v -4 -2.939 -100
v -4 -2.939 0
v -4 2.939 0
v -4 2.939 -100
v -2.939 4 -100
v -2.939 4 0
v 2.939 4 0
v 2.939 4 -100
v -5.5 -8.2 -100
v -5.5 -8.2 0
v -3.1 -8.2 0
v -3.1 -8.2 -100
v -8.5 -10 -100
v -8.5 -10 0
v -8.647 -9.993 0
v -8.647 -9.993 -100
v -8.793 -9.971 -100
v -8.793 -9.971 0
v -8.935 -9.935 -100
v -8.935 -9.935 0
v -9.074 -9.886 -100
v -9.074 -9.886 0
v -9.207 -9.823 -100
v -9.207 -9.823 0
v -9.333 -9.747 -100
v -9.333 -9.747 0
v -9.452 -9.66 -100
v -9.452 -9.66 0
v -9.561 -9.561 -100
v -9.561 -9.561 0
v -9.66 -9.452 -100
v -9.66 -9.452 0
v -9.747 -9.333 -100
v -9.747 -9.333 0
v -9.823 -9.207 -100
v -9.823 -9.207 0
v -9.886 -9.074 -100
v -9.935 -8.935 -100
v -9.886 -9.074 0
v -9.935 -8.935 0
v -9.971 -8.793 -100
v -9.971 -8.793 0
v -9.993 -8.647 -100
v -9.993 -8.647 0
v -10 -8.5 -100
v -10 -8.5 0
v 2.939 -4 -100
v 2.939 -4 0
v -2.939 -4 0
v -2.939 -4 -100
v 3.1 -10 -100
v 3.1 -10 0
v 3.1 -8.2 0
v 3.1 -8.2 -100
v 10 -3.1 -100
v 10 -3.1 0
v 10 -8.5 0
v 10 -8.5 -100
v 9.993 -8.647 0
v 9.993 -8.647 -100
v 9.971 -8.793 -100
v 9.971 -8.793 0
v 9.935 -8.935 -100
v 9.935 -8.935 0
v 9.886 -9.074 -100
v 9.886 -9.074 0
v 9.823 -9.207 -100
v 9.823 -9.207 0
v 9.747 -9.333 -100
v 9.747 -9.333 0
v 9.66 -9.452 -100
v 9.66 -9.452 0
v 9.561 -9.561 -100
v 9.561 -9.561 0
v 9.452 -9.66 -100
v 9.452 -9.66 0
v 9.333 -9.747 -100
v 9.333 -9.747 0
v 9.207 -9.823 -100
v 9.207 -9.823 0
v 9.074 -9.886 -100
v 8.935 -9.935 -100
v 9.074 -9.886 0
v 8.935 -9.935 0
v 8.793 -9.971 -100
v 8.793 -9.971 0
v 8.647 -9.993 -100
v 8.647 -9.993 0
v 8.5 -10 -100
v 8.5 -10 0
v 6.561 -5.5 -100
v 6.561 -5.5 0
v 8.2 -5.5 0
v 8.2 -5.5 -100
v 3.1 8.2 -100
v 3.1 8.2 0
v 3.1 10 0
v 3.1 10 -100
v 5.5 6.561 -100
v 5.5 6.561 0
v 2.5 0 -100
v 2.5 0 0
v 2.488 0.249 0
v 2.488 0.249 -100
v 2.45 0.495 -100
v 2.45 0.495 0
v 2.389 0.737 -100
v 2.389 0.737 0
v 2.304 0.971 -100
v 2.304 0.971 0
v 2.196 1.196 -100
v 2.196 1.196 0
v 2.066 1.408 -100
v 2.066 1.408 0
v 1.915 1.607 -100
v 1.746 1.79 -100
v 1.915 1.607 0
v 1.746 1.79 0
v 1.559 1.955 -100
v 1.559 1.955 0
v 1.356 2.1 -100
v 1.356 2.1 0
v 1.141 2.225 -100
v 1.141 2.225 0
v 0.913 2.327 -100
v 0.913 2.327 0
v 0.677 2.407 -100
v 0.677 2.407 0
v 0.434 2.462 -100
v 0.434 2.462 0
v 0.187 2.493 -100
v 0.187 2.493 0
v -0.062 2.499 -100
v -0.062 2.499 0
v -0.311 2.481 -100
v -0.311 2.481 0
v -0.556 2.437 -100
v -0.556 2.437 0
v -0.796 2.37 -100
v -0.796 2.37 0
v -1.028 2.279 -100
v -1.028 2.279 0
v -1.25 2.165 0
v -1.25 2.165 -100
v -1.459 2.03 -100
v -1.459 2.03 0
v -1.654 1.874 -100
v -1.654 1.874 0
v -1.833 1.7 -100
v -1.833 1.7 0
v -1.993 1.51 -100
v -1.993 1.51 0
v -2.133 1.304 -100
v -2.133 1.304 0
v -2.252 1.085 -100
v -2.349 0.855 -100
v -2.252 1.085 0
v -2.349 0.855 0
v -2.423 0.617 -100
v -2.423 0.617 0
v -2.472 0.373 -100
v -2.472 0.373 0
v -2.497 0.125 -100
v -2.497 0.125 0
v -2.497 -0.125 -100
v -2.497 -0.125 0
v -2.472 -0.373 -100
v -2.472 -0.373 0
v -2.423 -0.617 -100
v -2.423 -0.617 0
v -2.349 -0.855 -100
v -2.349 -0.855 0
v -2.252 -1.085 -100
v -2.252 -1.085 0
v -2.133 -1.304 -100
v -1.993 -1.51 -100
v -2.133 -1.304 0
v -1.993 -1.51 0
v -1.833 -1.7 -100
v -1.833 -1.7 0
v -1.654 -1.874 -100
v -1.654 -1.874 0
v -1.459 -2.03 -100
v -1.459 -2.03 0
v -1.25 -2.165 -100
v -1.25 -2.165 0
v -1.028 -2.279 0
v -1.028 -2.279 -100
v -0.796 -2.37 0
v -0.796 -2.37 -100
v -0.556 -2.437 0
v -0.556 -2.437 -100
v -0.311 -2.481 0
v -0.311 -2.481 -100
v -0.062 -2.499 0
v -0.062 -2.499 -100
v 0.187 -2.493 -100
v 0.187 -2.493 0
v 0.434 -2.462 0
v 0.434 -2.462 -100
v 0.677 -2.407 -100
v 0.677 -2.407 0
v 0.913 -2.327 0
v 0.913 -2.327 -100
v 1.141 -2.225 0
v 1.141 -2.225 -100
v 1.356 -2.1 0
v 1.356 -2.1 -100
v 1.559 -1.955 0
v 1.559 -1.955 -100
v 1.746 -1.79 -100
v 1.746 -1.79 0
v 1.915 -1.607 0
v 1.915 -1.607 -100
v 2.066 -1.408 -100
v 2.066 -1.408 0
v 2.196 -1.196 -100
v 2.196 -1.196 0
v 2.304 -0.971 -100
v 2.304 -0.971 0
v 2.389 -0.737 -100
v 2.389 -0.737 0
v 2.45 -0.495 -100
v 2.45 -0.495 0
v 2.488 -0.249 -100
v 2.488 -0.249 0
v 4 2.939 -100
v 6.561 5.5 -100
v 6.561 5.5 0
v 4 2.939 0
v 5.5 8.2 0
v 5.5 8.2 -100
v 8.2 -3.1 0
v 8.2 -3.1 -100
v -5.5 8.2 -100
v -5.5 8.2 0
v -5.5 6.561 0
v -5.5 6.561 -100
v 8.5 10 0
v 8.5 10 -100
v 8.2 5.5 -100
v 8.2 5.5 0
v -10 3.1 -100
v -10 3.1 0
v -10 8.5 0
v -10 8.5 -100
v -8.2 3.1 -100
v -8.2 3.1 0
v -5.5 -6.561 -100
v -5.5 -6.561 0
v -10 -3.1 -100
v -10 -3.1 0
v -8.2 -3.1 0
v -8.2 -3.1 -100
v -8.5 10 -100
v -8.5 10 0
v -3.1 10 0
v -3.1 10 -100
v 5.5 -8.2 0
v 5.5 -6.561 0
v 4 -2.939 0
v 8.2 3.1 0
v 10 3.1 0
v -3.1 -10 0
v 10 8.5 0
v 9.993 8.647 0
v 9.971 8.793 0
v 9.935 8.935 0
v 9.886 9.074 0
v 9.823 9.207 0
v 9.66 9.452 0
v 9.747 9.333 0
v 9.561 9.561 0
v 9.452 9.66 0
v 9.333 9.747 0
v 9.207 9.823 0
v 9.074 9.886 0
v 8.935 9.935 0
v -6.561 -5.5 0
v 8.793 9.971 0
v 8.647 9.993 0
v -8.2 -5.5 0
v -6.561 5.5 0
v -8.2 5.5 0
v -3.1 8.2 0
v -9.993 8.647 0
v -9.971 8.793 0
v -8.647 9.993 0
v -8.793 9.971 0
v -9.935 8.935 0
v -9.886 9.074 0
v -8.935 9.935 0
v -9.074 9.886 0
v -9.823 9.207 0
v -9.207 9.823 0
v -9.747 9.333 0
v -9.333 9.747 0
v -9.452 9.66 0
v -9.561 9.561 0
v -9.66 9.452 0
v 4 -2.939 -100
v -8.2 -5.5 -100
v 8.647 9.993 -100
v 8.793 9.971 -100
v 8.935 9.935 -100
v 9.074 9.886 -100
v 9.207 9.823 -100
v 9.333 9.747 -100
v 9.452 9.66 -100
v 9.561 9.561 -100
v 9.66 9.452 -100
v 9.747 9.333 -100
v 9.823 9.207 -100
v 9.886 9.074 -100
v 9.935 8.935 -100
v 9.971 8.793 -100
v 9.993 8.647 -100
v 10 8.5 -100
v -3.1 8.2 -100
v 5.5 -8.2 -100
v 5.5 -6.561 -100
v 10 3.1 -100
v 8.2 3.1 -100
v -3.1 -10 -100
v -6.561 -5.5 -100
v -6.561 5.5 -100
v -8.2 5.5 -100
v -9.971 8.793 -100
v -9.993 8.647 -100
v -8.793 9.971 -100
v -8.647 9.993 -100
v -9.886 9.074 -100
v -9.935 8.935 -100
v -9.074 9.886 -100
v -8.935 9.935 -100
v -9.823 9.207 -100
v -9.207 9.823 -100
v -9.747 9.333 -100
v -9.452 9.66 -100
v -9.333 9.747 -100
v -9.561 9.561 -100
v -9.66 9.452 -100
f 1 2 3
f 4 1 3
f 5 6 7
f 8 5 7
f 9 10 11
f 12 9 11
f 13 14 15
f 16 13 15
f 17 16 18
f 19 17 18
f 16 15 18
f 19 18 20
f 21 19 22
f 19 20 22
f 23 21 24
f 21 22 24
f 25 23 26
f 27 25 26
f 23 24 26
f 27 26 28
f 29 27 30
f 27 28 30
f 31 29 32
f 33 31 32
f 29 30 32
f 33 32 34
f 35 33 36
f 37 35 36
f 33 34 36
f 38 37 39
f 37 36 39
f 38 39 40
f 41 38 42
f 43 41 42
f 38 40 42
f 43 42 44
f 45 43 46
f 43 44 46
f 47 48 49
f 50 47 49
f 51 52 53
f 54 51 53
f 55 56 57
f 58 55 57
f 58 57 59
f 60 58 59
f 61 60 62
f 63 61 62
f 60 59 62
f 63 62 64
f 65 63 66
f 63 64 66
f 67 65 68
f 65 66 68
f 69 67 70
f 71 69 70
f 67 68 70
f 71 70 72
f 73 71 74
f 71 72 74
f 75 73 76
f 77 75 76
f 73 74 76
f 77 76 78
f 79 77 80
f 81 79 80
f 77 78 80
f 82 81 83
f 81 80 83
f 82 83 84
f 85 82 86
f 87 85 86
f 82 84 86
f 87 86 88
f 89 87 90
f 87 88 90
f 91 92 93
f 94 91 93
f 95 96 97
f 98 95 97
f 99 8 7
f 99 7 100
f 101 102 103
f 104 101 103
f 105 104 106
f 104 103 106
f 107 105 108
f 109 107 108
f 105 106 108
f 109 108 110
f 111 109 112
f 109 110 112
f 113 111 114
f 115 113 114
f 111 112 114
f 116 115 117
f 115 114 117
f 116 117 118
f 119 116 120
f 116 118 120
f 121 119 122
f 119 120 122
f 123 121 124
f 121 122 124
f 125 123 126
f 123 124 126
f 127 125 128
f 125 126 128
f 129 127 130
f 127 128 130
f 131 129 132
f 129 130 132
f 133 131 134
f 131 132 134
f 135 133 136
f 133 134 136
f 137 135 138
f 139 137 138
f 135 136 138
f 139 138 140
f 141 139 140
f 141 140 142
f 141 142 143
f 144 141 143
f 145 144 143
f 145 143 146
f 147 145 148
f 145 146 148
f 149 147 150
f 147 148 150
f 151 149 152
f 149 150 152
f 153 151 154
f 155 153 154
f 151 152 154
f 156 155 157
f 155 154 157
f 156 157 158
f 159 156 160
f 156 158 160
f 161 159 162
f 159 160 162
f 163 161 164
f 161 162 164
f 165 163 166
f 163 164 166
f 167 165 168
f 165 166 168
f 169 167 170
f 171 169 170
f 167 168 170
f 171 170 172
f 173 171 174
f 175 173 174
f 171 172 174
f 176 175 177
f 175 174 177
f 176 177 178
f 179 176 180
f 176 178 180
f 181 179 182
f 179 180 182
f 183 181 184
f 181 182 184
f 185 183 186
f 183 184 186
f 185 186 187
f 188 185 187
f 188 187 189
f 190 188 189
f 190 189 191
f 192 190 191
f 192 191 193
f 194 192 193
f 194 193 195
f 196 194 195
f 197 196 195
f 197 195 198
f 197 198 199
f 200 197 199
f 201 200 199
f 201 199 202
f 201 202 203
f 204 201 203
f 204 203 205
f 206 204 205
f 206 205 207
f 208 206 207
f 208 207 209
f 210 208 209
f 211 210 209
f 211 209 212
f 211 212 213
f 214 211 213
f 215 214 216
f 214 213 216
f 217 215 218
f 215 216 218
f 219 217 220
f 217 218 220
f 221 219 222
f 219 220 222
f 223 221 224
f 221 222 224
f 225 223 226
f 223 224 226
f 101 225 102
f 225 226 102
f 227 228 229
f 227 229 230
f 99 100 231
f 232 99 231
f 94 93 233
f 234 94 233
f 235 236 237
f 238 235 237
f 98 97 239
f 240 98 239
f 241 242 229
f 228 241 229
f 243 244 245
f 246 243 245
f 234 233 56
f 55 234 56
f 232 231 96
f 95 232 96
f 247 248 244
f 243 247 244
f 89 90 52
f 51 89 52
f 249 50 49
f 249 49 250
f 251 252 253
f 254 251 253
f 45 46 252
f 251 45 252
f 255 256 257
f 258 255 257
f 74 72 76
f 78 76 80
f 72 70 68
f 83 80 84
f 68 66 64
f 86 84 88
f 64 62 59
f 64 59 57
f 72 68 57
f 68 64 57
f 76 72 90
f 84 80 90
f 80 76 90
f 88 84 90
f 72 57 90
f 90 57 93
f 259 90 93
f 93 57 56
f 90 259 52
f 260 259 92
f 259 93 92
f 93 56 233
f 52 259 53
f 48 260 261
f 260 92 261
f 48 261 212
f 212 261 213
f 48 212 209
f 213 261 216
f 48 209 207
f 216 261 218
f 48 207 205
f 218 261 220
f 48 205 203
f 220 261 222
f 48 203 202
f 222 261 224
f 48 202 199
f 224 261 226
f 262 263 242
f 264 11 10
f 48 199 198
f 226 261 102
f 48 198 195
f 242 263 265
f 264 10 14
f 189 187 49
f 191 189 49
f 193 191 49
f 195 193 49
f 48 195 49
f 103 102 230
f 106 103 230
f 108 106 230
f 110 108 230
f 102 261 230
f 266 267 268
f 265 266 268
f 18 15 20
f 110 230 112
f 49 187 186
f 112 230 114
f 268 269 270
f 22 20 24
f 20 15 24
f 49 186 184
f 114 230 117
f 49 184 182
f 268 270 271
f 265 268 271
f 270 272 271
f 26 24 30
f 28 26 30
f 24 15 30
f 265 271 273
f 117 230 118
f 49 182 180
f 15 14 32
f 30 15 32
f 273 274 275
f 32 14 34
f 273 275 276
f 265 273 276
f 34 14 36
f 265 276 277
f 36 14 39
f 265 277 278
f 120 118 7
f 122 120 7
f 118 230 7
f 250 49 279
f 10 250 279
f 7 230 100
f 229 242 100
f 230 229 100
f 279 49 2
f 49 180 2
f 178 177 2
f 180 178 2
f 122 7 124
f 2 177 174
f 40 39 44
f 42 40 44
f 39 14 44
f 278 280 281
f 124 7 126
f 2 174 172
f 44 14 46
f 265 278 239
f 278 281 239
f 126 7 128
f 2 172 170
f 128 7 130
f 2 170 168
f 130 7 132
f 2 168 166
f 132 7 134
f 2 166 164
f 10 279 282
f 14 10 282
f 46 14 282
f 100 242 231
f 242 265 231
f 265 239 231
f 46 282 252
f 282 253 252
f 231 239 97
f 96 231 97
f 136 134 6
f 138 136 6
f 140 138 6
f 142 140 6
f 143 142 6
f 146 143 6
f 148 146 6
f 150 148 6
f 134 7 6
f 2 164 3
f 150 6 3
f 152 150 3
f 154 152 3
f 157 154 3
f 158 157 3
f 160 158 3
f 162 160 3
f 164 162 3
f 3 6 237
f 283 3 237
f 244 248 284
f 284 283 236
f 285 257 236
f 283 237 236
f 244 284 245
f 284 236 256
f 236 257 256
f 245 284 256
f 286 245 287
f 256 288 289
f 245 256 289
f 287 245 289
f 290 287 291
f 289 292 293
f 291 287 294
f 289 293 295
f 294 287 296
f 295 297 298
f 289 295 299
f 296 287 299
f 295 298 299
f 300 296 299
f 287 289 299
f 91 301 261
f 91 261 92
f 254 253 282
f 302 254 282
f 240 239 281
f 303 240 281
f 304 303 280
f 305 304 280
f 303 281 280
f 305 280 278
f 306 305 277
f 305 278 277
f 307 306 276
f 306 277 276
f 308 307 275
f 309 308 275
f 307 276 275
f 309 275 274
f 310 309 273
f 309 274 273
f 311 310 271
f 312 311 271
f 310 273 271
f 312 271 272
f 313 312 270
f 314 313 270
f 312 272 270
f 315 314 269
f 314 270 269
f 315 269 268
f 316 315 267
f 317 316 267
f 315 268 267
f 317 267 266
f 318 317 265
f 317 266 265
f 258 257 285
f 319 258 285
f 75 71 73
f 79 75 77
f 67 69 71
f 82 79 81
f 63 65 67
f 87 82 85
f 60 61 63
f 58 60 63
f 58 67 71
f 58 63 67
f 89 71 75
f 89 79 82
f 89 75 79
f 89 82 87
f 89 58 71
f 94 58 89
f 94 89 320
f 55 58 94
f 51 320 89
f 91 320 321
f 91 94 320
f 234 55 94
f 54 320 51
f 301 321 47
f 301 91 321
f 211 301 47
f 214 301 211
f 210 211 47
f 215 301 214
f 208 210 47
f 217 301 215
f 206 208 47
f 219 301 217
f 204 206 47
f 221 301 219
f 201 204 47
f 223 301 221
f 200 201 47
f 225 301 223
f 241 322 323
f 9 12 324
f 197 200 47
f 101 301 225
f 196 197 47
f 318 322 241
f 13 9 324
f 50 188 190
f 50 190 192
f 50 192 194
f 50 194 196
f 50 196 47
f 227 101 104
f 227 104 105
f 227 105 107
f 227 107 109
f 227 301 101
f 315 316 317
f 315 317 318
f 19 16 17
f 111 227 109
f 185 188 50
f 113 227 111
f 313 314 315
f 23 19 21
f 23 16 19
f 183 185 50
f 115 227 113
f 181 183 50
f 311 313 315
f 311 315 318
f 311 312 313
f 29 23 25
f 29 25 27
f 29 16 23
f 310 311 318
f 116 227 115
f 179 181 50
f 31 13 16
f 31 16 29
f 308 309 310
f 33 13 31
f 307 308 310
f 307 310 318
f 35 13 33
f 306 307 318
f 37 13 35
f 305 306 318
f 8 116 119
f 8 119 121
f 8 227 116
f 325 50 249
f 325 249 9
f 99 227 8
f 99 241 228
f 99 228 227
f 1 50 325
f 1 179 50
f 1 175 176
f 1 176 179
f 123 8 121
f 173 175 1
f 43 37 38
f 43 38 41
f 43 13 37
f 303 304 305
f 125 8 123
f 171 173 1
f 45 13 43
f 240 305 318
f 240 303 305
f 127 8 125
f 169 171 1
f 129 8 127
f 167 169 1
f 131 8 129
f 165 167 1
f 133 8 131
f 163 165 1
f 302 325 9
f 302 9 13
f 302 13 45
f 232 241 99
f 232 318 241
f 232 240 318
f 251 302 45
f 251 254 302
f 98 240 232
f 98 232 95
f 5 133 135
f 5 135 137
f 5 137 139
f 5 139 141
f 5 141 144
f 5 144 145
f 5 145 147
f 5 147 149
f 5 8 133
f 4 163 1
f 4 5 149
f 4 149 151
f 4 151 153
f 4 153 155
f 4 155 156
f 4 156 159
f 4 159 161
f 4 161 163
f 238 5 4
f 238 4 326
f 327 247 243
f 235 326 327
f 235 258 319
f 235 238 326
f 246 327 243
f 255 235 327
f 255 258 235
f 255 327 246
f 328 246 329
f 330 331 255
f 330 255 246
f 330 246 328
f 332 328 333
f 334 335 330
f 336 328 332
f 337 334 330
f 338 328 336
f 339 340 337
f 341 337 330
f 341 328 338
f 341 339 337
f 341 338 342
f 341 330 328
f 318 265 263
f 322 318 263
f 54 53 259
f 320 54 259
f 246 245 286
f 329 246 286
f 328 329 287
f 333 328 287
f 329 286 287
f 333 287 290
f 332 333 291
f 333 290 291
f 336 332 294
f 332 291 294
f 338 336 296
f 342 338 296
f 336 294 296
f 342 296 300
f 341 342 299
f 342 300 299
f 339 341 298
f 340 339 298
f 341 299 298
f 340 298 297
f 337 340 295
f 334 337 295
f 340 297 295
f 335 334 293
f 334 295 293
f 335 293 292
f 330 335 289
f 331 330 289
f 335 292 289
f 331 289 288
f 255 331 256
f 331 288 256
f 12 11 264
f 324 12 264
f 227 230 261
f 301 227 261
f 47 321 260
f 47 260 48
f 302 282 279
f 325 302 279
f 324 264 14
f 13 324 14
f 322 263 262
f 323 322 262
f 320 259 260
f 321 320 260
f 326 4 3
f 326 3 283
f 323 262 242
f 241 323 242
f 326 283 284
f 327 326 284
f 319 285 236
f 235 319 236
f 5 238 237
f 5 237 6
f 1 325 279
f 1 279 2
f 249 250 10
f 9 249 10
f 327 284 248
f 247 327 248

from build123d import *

# Parameters (mm, degrees)
SKETCH_1_R      = 2.5
EXTRUDE_2_DEPTH = 100


with BuildPart() as part:
    # 草图1 → 凸台-拉伸2 (new body)
    with BuildSketch(Plane.XY):
        with BuildLine():
            Line((5.5, -8.2), (5.5, -6.560660172))
            Line((5.5, -6.560660172), (2.939339828, -4))
            Line((2.939339828, -4), (-2.939339828, -4))
            Line((-2.939339828, -4), (-5.5, -6.560660172))
            Line((-5.5, -6.560660172), (-5.5, -8.2))
            Line((-5.5, -8.2), (-3.1, -8.2))
            Line((-3.1, -8.2), (-3.1, -10))
            Line((-3.1, -10), (-8.5, -10))
            ThreePointArc((-8.5, -10), (-9.560660172, -9.560660172), (-10, -8.5))
            Line((-10, -8.5), (-10, -3.1))
            Line((-10, -3.1), (-8.2, -3.1))
            Line((-8.2, -3.1), (-8.2, -5.5))
            Line((-8.2, -5.5), (-6.560660172, -5.5))
            Line((-6.560660172, -5.5), (-4, -2.939339828))
            Line((-4, -2.939339828), (-4, 2.939339828))
            Line((-4, 2.939339828), (-6.560660172, 5.5))
            Line((-6.560660172, 5.5), (-8.2, 5.5))
            Line((-8.2, 5.5), (-8.2, 3.1))
            Line((-8.2, 3.1), (-10, 3.1))
            Line((-10, 3.1), (-10, 8.5))
            ThreePointArc((-10, 8.5), (-9.560660172, 9.560660172), (-8.5, 10))
            Line((-8.5, 10), (-3.1, 10))
            Line((-3.1, 10), (-3.1, 8.2))
            Line((-3.1, 8.2), (-5.5, 8.2))
            Line((-5.5, 8.2), (-5.5, 6.560660172))
            Line((-5.5, 6.560660172), (-2.939339828, 4))
            Line((-2.939339828, 4), (2.939339828, 4))
            Line((2.939339828, 4), (5.5, 6.560660172))
            Line((5.5, 6.560660172), (5.5, 8.2))
            Line((5.5, 8.2), (3.1, 8.2))
            Line((3.1, 8.2), (3.1, 10))
            Line((3.1, 10), (8.5, 10))
            ThreePointArc((8.5, 10), (9.560660172, 9.560660172), (10, 8.5))
            Line((10, 8.5), (10, 3.1))
            Line((10, 3.1), (8.2, 3.1))
            Line((8.2, 3.1), (8.2, 5.5))
            Line((8.2, 5.5), (6.560660172, 5.5))
            Line((6.560660172, 5.5), (4, 2.939339828))
            Line((4, 2.939339828), (4, -2.939339828))
            Line((4, -2.939339828), (6.560660172, -5.5))
            Line((6.560660172, -5.5), (8.2, -5.5))
            Line((8.2, -5.5), (8.2, -3.1))
            Line((8.2, -3.1), (10, -3.1))
            Line((10, -3.1), (10, -8.5))
            ThreePointArc((10, -8.5), (9.560660172, -9.560660172), (8.5, -10))
            Line((8.5, -10), (3.1, -10))
            Line((3.1, -10), (3.1, -8.2))
            Line((3.1, -8.2), (5.5, -8.2))
        make_face()
        Circle(SKETCH_1_R, mode=Mode.SUBTRACT)
    extrude(amount=-EXTRUDE_2_DEPTH)


solid = part.part
